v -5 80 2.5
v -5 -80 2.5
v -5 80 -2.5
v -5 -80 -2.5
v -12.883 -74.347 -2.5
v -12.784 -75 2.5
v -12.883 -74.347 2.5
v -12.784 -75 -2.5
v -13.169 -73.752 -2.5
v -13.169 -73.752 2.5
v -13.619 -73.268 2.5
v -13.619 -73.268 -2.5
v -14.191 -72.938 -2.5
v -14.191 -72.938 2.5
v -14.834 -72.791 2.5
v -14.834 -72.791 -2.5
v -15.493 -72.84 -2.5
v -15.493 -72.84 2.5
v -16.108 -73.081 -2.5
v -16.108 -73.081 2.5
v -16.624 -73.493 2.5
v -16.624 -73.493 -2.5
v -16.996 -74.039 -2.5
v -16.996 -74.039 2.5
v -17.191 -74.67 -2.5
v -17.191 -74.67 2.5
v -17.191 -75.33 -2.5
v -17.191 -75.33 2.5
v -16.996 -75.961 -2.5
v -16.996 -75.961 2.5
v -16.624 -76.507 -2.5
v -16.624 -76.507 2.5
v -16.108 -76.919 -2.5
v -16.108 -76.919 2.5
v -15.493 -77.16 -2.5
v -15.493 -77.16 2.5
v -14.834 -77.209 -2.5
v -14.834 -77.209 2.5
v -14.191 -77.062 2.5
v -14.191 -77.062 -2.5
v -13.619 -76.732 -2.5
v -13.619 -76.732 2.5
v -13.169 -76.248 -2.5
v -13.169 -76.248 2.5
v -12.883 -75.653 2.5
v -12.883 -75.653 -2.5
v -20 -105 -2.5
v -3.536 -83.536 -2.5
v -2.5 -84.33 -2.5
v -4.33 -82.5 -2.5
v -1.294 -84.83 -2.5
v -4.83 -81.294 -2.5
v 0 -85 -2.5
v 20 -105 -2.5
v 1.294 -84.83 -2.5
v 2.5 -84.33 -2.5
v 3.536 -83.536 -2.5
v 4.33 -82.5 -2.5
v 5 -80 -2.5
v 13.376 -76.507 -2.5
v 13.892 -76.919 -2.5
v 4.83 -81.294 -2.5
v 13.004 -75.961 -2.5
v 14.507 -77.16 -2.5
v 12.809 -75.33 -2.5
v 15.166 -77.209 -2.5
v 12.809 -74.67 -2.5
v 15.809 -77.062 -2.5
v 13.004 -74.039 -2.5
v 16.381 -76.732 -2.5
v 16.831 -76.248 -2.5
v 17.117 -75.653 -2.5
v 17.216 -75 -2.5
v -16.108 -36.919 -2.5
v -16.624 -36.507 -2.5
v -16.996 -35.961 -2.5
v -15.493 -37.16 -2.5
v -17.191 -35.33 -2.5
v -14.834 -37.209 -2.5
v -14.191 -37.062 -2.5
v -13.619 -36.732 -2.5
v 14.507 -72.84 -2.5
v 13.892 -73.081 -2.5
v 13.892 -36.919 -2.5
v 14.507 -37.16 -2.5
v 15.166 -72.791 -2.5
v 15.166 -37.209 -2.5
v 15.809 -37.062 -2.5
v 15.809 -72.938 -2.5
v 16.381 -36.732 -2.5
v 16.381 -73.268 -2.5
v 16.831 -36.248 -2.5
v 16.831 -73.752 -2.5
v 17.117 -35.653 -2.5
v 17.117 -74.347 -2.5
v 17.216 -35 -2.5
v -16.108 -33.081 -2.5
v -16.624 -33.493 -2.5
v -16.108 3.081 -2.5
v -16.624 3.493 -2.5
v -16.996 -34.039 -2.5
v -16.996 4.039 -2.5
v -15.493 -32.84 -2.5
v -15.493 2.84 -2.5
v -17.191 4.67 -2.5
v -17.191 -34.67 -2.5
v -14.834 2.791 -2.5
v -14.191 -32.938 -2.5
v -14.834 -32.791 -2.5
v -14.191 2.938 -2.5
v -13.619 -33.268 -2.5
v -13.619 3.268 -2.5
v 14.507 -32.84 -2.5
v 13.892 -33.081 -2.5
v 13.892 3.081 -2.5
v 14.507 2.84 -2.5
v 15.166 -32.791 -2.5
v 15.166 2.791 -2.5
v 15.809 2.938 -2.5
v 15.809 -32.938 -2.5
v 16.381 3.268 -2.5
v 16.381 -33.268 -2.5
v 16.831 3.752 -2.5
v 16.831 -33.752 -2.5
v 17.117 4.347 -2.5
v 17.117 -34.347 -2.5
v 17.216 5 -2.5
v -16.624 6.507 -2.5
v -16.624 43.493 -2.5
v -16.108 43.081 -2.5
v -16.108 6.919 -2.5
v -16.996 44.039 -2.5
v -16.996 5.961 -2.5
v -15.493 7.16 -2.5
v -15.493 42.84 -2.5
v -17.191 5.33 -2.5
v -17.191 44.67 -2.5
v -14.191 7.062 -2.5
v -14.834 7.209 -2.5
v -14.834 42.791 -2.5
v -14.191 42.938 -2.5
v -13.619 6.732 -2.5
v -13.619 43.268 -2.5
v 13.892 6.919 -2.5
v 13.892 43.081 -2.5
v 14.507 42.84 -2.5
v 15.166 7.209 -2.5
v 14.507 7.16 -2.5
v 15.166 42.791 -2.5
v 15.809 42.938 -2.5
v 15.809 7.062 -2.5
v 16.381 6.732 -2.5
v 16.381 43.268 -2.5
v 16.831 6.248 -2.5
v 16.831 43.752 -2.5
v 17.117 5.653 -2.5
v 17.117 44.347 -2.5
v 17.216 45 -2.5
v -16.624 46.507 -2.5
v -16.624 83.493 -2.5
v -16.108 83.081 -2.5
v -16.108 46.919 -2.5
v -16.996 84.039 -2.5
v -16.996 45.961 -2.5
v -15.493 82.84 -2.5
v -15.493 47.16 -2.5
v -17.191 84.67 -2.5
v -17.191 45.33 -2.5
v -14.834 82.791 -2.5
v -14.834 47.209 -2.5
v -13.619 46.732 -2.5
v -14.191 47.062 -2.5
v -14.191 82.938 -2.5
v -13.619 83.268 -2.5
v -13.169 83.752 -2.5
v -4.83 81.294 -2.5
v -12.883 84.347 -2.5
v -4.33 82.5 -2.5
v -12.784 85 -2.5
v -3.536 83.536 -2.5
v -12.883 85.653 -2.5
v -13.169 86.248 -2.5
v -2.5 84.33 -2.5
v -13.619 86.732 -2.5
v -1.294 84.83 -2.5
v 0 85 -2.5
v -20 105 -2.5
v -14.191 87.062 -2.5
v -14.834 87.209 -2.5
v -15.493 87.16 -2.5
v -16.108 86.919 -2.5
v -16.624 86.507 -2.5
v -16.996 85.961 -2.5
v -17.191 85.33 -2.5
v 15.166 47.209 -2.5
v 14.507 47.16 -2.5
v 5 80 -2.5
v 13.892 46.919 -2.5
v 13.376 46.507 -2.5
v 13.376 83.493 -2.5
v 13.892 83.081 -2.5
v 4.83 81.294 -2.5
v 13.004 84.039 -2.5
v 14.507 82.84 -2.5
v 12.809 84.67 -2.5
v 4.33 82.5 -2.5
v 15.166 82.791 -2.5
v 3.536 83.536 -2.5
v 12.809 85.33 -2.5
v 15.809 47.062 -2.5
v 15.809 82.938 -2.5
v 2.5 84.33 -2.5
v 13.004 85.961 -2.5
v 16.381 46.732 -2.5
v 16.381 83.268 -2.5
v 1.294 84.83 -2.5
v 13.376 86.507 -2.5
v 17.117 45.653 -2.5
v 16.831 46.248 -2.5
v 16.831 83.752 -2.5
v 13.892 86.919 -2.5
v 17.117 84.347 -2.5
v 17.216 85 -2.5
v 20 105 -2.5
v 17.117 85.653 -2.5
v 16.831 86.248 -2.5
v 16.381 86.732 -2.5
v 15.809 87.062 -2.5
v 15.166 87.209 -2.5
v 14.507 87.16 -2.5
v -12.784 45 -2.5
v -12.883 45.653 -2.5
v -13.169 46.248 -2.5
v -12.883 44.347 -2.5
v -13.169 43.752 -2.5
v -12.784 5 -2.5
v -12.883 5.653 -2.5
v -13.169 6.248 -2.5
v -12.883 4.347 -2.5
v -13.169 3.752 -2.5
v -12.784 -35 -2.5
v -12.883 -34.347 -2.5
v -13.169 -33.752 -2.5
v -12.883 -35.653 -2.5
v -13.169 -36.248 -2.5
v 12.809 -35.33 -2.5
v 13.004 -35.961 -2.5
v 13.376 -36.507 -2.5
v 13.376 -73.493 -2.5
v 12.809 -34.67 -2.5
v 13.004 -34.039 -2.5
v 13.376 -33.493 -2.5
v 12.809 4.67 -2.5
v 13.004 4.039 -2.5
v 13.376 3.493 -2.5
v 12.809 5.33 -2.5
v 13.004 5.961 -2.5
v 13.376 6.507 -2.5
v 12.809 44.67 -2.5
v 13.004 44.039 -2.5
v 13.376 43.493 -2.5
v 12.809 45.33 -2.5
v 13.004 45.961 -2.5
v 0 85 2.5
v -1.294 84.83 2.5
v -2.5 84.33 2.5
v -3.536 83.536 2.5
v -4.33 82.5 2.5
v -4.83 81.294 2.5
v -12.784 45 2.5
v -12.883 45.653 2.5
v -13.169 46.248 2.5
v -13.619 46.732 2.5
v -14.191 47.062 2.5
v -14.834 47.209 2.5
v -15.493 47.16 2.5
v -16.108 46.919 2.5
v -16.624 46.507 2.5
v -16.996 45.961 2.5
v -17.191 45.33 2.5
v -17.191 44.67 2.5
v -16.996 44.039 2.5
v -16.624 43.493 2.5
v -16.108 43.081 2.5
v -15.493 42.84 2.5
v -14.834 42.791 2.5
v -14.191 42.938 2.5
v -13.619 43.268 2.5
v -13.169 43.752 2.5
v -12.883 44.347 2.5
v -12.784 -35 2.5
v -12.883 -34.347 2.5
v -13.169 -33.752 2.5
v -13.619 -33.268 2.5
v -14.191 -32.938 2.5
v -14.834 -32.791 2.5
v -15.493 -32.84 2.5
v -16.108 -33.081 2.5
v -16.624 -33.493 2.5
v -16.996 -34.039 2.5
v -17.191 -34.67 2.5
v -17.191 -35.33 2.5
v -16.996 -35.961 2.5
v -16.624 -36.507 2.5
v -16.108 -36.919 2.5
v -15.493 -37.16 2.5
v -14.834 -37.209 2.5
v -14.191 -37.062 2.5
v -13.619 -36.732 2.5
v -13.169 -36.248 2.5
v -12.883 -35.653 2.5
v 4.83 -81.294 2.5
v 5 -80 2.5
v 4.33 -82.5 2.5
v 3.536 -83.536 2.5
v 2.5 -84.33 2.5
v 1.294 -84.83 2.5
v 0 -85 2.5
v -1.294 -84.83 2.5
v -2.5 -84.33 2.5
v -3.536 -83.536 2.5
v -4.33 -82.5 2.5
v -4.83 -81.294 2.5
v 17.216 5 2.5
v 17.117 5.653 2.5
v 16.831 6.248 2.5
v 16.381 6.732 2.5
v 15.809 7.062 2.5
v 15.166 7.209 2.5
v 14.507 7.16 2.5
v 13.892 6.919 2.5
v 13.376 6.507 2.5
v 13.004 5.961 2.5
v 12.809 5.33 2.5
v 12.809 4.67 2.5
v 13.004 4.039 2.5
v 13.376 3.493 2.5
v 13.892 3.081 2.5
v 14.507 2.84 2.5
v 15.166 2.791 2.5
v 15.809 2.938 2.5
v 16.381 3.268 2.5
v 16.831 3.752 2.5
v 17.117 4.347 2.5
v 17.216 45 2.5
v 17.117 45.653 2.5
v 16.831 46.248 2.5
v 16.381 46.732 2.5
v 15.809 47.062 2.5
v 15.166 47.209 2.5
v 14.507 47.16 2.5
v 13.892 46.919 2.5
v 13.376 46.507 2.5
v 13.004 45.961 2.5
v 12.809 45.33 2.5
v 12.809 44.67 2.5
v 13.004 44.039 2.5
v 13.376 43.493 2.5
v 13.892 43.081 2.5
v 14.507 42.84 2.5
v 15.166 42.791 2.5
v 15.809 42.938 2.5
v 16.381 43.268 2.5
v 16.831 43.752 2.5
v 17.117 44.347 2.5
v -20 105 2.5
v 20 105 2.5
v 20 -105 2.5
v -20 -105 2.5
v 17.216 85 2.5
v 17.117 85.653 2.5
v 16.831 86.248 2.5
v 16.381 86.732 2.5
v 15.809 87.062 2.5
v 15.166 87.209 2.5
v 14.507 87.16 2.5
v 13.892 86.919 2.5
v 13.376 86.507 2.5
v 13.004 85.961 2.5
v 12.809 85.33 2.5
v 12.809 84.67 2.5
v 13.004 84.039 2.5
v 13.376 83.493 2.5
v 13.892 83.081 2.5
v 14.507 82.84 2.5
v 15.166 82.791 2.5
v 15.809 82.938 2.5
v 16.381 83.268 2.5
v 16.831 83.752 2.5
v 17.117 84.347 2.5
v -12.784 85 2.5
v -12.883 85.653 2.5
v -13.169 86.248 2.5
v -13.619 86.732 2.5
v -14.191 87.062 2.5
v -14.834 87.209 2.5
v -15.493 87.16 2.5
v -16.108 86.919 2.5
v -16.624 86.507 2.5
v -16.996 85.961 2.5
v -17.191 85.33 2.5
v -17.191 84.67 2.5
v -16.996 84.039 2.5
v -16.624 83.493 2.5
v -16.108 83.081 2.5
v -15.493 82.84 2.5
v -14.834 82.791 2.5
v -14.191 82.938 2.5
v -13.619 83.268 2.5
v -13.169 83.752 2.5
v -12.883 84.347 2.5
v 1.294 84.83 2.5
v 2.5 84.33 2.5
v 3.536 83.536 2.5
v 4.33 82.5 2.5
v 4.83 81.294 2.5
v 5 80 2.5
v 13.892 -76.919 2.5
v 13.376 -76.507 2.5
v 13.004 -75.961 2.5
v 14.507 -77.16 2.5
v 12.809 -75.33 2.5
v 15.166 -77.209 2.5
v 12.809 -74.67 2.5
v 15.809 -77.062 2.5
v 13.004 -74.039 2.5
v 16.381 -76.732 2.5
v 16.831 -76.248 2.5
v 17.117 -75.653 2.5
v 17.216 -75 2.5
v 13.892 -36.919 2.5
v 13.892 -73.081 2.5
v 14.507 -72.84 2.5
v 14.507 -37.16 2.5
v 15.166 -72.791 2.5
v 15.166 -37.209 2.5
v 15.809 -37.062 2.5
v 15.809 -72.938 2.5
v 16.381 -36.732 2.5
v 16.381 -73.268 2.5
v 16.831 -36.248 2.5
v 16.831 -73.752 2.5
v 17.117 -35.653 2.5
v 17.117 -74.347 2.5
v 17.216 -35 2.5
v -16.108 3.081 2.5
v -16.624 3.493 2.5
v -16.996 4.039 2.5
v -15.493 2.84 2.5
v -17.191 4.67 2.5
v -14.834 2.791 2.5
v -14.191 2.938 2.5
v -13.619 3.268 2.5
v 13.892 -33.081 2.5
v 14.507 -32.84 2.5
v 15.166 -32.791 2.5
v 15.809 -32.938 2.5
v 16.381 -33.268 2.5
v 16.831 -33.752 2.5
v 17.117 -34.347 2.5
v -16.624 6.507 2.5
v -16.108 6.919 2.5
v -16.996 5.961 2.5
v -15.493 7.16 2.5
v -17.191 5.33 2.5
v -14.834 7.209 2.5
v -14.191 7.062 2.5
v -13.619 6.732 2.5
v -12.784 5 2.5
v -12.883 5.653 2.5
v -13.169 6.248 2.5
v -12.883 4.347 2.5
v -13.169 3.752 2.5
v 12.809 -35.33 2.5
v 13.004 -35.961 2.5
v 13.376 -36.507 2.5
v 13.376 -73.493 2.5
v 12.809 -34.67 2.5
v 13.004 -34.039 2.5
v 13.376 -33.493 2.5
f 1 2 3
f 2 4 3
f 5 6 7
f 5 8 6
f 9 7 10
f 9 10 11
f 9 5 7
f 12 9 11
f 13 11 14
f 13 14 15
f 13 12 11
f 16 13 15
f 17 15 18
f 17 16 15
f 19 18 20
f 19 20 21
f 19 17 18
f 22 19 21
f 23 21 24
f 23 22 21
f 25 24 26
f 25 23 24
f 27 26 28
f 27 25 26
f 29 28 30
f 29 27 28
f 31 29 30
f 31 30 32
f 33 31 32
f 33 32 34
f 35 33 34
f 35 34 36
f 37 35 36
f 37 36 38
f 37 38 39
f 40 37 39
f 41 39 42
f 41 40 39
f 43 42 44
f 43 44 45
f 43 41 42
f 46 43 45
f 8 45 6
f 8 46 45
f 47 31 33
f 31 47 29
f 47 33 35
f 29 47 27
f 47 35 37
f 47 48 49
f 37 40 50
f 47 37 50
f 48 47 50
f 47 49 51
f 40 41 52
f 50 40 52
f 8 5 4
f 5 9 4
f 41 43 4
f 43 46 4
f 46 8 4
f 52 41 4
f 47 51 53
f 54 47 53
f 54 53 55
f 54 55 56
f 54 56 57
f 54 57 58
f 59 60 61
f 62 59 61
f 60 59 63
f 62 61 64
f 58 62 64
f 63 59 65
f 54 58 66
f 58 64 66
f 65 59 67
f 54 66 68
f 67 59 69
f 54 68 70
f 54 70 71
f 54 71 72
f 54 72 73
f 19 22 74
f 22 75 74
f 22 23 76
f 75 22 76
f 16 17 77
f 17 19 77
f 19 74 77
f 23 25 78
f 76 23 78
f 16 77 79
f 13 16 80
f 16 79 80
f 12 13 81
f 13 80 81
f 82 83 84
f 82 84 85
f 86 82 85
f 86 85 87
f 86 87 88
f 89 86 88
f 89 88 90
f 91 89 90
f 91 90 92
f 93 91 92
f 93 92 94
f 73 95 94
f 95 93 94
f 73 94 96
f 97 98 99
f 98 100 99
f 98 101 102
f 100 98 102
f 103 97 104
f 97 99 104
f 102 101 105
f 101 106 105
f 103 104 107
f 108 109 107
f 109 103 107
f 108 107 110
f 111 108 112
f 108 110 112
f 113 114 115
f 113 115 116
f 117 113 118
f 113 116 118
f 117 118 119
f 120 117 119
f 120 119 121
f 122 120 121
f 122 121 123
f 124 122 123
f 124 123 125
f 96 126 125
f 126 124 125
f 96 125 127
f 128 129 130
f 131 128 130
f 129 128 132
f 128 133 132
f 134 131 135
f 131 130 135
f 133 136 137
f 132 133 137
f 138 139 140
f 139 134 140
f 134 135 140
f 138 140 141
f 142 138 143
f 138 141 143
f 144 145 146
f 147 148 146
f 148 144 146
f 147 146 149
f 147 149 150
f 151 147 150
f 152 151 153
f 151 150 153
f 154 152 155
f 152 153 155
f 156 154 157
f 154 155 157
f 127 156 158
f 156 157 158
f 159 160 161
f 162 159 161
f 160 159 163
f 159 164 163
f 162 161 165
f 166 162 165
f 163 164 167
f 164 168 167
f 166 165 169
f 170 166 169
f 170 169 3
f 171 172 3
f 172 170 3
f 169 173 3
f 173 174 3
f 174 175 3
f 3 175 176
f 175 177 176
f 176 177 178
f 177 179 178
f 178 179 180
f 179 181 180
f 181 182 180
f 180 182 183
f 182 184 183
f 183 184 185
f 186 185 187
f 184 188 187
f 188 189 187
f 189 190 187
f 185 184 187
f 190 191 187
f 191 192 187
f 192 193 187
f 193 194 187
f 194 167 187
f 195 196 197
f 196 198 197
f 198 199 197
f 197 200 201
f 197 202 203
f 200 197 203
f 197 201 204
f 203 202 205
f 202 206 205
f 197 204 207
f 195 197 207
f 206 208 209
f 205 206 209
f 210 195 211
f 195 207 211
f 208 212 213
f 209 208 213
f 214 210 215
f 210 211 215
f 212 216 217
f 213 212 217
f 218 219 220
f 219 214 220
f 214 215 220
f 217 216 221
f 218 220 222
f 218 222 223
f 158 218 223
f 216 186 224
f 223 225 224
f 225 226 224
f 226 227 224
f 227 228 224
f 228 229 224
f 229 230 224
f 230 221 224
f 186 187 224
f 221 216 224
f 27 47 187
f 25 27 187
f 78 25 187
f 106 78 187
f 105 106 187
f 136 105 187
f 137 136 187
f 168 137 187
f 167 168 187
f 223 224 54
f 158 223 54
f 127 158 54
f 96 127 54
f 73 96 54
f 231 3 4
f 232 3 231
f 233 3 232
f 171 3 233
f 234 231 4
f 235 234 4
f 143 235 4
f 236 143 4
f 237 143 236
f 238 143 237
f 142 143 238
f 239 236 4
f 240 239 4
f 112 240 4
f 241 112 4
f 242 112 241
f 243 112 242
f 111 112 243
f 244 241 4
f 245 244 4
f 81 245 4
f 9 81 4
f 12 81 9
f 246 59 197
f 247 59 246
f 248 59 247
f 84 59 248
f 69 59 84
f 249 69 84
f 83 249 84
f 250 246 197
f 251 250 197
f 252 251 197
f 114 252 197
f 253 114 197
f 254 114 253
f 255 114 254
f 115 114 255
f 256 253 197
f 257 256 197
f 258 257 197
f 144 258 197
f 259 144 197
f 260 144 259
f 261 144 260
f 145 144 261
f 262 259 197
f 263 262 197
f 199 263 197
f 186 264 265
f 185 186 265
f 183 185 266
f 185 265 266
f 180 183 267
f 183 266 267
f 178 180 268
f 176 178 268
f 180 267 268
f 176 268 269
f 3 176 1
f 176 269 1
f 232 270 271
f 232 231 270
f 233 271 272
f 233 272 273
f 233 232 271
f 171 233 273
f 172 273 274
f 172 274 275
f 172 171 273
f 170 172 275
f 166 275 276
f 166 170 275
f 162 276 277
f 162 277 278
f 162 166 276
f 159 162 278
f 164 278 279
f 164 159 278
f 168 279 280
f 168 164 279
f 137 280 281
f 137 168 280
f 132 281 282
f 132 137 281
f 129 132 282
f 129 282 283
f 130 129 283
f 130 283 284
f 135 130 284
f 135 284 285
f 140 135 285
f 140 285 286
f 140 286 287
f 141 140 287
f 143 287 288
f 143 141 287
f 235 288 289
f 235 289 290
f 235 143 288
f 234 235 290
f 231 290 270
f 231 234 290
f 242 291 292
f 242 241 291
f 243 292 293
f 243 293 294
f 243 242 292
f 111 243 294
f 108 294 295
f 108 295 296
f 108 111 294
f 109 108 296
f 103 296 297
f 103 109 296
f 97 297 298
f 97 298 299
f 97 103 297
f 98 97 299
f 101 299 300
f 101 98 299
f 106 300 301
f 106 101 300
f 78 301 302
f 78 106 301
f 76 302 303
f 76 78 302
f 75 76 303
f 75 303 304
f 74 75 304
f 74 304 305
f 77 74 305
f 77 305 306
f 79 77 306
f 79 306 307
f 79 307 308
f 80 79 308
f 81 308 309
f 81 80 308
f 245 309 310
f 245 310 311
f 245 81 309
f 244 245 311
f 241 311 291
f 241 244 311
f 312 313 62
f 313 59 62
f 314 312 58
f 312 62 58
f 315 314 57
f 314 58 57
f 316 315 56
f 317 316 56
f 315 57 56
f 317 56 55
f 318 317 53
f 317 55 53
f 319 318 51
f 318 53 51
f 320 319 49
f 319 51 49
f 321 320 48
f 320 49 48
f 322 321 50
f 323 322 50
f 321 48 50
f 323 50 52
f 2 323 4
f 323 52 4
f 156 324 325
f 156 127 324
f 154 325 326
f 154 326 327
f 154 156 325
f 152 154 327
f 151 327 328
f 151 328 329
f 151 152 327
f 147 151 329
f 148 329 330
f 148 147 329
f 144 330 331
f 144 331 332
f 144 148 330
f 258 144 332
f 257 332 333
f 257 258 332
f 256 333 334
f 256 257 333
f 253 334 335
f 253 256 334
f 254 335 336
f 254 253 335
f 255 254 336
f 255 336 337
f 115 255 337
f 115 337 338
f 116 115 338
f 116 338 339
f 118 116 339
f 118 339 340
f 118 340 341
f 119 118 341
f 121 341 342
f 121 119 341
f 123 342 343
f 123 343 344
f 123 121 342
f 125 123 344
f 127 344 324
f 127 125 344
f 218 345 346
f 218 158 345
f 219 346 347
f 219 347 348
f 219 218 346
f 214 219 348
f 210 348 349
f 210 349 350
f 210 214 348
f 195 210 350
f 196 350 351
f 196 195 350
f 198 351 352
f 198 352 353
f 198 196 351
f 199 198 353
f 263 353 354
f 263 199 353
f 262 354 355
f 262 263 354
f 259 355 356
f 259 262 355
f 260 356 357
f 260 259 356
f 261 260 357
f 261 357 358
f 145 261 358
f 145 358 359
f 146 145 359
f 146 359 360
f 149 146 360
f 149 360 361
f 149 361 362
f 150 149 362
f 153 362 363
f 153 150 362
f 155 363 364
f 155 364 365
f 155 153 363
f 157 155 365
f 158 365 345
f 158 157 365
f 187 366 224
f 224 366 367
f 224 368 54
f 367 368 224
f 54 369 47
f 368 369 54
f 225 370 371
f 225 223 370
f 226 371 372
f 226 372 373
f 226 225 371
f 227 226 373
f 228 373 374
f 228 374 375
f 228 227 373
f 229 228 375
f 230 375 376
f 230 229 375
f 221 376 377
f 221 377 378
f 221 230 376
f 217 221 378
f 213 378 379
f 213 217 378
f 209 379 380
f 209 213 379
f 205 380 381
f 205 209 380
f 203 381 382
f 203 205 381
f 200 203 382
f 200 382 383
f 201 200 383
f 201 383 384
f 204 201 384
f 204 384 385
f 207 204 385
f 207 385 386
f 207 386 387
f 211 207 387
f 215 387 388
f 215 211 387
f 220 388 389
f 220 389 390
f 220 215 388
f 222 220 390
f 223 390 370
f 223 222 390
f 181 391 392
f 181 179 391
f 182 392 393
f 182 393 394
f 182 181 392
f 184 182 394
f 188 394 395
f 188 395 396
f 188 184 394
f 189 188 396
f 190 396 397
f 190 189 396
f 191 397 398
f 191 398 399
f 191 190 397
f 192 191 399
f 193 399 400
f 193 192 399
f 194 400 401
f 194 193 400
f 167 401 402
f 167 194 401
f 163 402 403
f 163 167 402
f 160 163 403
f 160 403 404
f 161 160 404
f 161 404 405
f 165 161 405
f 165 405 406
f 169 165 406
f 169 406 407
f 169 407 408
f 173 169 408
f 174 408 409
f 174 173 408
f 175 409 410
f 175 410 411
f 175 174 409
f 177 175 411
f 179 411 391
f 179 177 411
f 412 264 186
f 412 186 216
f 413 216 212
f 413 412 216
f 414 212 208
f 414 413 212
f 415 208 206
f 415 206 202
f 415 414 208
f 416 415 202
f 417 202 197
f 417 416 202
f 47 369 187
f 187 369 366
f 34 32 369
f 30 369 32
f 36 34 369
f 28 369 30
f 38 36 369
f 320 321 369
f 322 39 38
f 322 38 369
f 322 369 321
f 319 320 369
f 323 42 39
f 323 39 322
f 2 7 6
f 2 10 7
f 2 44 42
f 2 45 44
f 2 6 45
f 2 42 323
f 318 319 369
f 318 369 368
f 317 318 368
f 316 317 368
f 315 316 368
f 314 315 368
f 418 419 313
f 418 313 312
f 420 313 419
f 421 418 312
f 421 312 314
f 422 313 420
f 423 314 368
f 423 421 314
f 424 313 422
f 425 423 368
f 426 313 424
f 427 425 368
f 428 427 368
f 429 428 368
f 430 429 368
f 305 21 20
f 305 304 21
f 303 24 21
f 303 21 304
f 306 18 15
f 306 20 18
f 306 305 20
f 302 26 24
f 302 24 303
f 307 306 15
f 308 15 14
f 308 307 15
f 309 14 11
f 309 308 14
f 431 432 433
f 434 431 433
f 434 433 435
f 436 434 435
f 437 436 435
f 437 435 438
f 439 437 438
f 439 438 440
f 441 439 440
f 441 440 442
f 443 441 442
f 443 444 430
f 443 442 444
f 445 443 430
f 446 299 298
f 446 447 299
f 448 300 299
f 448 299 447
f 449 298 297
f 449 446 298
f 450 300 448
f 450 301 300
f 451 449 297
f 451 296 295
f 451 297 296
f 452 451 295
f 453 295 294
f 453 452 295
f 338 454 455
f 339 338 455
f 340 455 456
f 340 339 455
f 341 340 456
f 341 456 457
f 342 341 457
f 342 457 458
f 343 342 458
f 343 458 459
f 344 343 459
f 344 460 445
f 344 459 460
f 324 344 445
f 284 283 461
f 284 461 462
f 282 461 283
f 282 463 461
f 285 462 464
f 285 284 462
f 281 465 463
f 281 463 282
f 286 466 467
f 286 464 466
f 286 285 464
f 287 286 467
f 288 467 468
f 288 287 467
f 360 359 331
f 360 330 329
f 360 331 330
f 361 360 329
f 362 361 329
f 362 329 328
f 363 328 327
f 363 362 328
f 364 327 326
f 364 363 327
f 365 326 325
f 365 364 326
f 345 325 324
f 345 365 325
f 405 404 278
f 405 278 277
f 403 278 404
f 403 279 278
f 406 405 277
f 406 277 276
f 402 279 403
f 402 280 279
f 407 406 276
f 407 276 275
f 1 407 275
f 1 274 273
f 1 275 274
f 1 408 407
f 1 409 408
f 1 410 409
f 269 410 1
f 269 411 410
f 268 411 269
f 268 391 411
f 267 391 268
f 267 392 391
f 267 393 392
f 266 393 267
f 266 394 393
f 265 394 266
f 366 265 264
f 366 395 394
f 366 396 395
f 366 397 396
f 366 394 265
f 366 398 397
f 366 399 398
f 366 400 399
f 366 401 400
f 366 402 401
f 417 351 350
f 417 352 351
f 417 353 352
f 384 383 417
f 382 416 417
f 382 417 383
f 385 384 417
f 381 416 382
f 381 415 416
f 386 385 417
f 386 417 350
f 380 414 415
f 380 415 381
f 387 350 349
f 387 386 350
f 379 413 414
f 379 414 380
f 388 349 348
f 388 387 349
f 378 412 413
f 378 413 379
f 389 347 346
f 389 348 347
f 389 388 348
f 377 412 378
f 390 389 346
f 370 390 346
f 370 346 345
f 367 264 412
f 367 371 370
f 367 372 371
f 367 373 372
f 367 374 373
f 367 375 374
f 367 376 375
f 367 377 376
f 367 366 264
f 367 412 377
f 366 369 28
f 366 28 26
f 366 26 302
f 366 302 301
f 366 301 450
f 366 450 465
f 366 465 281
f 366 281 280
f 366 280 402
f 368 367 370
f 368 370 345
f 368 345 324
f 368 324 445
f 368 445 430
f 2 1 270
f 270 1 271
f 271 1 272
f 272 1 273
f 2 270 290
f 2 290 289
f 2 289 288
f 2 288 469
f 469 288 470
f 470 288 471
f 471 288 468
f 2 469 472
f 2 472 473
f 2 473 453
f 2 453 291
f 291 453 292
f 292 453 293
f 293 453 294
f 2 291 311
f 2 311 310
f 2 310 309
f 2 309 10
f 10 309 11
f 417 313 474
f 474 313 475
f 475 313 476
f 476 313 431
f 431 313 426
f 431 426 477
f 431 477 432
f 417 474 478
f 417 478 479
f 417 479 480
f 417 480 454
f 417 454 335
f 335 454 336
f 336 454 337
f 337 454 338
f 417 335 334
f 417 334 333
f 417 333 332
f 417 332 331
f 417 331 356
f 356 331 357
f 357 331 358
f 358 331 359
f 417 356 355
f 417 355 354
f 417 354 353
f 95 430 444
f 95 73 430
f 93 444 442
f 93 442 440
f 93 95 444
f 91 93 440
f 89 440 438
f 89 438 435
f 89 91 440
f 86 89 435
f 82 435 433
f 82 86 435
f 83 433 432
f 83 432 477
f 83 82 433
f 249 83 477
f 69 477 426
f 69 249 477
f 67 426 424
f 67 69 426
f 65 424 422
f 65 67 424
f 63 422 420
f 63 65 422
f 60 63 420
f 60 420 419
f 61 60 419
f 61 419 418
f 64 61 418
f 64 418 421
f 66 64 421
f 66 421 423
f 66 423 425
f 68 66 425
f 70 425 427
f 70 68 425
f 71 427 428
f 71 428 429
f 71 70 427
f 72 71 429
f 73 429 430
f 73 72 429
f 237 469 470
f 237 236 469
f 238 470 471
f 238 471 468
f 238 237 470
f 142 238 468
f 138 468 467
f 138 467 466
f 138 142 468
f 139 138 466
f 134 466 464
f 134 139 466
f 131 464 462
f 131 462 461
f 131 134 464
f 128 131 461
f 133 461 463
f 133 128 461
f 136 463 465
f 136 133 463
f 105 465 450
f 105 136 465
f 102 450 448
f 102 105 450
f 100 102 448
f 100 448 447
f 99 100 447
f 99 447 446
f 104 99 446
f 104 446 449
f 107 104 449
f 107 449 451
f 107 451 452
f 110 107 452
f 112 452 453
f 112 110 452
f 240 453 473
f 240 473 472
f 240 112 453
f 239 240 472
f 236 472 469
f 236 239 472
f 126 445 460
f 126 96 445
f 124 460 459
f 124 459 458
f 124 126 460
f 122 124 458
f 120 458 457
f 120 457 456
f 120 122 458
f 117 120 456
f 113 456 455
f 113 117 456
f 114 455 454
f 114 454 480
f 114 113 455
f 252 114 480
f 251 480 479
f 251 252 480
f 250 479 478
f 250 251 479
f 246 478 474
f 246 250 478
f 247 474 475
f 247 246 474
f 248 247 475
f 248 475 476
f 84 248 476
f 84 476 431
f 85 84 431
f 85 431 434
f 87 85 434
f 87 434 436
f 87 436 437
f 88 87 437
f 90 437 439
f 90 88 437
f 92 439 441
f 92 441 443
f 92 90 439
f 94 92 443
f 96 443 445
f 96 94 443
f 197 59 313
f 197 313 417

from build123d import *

# Parameters (mm, degrees)
F0_W          = 40
F0_H          = 210
F0_R          = 2.2155
F0_W_2        = 10
F0_H_2        = 170
F1_DEPTH      = 2.5
F1_DEPTH_BACK = 2.5
F2_R          = 4.99999


# Not quite as in the source:
# - a fillet or chamfer is up to 0.001 mm smaller than in the source, because OpenCascade refuses the exact size


with BuildPart() as f1:
    # F0 (on Top) → F1 (new body, two sides)
    with BuildSketch(Plane.XY) as f1_sk:
        Rectangle(F0_W, F0_H)
        with Locations((-15, -75)):
            Circle(F0_R, mode=Mode.SUBTRACT)
        with Locations((-15, -35)):
            Circle(F0_R, mode=Mode.SUBTRACT)
        with Locations((15, -75)):
            Circle(F0_R, mode=Mode.SUBTRACT)
        with Locations((15, -35)):
            Circle(F0_R, mode=Mode.SUBTRACT)
        with Locations((-15, 5)):
            Circle(F0_R, mode=Mode.SUBTRACT)
        with Locations((-15, 45)):
            Circle(F0_R, mode=Mode.SUBTRACT)
        with Locations((-15, 85)):
            Circle(F0_R, mode=Mode.SUBTRACT)
        Rectangle(F0_W_2, F0_H_2, mode=Mode.SUBTRACT)
        with Locations((15, 5)):
            Circle(F0_R, mode=Mode.SUBTRACT)
        with Locations((15, 45)):
            Circle(F0_R, mode=Mode.SUBTRACT)
        with Locations((15, 85)):
            Circle(F0_R, mode=Mode.SUBTRACT)
    extrude(amount=F1_DEPTH)
    extrude(f1_sk.sketch, amount=-F1_DEPTH_BACK)

    # F2 (radius 5 in the source; OpenCascade refuses exactly that, so slightly less here)
    f2_edges = [f1.edges().sort_by_distance(p)[0] for p in [
        (-5, 85, 0),
        (5, 85, 0),
        (-5, -85, 0),
        (5, -85, 0),
    ]]
    fillet(f2_edges, radius=F2_R)


solid = f1.part
